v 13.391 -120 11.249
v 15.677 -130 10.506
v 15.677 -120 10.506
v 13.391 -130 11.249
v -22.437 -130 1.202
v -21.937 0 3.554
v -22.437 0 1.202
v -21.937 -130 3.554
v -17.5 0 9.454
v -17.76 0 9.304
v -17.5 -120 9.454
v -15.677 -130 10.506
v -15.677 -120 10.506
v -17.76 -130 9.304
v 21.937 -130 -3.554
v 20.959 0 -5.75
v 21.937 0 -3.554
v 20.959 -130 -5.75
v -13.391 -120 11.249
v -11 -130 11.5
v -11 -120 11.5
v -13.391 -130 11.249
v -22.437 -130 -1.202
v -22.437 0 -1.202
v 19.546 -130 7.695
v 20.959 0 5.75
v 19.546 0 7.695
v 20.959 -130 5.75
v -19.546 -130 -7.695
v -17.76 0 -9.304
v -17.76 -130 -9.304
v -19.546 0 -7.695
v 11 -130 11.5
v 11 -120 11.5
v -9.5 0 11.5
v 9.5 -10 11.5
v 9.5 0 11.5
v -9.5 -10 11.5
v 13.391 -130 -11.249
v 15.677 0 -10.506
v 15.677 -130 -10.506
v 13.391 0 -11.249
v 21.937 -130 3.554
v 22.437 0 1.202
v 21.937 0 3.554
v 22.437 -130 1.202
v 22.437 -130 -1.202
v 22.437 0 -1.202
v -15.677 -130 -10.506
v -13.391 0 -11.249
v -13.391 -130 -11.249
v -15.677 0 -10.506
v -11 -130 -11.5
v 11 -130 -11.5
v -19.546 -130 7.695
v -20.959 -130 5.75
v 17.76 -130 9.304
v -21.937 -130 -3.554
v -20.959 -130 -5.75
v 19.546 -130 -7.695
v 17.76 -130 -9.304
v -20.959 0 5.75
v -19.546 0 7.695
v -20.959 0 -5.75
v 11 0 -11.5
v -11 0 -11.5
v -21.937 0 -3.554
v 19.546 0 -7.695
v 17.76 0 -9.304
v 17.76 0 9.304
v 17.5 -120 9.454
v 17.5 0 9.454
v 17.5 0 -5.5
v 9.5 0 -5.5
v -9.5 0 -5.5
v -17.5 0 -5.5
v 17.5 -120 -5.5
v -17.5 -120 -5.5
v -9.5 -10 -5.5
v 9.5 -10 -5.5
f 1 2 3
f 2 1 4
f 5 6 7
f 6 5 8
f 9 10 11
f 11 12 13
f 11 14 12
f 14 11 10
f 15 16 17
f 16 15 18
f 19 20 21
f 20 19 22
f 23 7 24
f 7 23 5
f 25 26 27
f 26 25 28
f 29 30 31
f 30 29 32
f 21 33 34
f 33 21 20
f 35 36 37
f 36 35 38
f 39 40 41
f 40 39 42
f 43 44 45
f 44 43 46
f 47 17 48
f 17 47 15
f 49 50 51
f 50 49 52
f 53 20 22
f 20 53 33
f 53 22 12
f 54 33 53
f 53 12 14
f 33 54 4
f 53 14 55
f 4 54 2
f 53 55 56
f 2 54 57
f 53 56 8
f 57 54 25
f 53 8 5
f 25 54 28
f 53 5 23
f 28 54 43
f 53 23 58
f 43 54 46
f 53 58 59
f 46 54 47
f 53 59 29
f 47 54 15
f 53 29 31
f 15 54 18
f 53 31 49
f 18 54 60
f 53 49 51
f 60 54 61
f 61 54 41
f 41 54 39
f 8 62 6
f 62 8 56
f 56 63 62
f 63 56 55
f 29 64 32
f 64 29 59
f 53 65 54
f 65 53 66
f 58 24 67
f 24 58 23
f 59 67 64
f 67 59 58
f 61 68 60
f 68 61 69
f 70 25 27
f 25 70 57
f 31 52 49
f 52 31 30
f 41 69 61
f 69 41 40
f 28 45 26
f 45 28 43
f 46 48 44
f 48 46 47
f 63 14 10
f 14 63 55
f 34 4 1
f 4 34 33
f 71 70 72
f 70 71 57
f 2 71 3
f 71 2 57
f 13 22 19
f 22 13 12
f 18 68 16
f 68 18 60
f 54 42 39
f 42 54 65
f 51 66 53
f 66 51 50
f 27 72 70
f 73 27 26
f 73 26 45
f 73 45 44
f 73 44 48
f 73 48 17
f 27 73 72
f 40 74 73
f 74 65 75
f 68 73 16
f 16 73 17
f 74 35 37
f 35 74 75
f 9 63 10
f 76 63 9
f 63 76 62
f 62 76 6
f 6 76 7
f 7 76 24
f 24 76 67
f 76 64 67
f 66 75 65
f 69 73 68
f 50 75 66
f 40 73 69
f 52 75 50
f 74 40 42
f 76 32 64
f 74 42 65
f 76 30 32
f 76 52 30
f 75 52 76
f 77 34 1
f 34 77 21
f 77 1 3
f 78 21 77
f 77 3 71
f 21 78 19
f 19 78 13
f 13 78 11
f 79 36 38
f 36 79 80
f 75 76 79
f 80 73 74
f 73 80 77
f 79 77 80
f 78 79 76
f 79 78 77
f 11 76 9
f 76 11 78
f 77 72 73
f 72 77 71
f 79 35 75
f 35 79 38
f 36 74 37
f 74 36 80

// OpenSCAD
//CUSTOMIZER VARIABLES

// LiPo length
lipo_len = 110; // [20:128]

// LiPo width
lipo_wdt = 35; // [10:40]

// LiPo height
lipo_hgt = 17; // [5:20]

//CUSTOMIZER VARIABLES END


rotate([90,-90,0])
difference() {
    // NiMh battery analog
    height = 23*1;
    width  = 45*1;
    length = 130*1;

    radius = height / 2;
    cyl_cc = width - (radius * 2);
    cyl_from_c = cyl_cc / 2;

    hull() {
        translate([0,cyl_from_c,0]) {
            cylinder (length, radius, radius);
        }
        translate([0,-cyl_from_c,0]) {
            cylinder (length, radius, radius);
        }
    }

    // LiPo cutout
    
    translate([radius-lipo_hgt,-lipo_wdt/2,(length-lipo_len)/2]) {
        cube([lipo_hgt,lipo_wdt,lipo_len]);
    }

    // Cable cutouts
    cut_width = 8; // [2:10]
    translate([radius-lipo_hgt,(-cut_width)+lipo_wdt/2,0]) {
        cube([lipo_hgt,cut_width,(length-lipo_len)/2]);
    }

    translate([radius-lipo_hgt,-lipo_wdt/2,0]) {
        cube([lipo_hgt,cut_width,(length-lipo_len)/2]);
    }

}
